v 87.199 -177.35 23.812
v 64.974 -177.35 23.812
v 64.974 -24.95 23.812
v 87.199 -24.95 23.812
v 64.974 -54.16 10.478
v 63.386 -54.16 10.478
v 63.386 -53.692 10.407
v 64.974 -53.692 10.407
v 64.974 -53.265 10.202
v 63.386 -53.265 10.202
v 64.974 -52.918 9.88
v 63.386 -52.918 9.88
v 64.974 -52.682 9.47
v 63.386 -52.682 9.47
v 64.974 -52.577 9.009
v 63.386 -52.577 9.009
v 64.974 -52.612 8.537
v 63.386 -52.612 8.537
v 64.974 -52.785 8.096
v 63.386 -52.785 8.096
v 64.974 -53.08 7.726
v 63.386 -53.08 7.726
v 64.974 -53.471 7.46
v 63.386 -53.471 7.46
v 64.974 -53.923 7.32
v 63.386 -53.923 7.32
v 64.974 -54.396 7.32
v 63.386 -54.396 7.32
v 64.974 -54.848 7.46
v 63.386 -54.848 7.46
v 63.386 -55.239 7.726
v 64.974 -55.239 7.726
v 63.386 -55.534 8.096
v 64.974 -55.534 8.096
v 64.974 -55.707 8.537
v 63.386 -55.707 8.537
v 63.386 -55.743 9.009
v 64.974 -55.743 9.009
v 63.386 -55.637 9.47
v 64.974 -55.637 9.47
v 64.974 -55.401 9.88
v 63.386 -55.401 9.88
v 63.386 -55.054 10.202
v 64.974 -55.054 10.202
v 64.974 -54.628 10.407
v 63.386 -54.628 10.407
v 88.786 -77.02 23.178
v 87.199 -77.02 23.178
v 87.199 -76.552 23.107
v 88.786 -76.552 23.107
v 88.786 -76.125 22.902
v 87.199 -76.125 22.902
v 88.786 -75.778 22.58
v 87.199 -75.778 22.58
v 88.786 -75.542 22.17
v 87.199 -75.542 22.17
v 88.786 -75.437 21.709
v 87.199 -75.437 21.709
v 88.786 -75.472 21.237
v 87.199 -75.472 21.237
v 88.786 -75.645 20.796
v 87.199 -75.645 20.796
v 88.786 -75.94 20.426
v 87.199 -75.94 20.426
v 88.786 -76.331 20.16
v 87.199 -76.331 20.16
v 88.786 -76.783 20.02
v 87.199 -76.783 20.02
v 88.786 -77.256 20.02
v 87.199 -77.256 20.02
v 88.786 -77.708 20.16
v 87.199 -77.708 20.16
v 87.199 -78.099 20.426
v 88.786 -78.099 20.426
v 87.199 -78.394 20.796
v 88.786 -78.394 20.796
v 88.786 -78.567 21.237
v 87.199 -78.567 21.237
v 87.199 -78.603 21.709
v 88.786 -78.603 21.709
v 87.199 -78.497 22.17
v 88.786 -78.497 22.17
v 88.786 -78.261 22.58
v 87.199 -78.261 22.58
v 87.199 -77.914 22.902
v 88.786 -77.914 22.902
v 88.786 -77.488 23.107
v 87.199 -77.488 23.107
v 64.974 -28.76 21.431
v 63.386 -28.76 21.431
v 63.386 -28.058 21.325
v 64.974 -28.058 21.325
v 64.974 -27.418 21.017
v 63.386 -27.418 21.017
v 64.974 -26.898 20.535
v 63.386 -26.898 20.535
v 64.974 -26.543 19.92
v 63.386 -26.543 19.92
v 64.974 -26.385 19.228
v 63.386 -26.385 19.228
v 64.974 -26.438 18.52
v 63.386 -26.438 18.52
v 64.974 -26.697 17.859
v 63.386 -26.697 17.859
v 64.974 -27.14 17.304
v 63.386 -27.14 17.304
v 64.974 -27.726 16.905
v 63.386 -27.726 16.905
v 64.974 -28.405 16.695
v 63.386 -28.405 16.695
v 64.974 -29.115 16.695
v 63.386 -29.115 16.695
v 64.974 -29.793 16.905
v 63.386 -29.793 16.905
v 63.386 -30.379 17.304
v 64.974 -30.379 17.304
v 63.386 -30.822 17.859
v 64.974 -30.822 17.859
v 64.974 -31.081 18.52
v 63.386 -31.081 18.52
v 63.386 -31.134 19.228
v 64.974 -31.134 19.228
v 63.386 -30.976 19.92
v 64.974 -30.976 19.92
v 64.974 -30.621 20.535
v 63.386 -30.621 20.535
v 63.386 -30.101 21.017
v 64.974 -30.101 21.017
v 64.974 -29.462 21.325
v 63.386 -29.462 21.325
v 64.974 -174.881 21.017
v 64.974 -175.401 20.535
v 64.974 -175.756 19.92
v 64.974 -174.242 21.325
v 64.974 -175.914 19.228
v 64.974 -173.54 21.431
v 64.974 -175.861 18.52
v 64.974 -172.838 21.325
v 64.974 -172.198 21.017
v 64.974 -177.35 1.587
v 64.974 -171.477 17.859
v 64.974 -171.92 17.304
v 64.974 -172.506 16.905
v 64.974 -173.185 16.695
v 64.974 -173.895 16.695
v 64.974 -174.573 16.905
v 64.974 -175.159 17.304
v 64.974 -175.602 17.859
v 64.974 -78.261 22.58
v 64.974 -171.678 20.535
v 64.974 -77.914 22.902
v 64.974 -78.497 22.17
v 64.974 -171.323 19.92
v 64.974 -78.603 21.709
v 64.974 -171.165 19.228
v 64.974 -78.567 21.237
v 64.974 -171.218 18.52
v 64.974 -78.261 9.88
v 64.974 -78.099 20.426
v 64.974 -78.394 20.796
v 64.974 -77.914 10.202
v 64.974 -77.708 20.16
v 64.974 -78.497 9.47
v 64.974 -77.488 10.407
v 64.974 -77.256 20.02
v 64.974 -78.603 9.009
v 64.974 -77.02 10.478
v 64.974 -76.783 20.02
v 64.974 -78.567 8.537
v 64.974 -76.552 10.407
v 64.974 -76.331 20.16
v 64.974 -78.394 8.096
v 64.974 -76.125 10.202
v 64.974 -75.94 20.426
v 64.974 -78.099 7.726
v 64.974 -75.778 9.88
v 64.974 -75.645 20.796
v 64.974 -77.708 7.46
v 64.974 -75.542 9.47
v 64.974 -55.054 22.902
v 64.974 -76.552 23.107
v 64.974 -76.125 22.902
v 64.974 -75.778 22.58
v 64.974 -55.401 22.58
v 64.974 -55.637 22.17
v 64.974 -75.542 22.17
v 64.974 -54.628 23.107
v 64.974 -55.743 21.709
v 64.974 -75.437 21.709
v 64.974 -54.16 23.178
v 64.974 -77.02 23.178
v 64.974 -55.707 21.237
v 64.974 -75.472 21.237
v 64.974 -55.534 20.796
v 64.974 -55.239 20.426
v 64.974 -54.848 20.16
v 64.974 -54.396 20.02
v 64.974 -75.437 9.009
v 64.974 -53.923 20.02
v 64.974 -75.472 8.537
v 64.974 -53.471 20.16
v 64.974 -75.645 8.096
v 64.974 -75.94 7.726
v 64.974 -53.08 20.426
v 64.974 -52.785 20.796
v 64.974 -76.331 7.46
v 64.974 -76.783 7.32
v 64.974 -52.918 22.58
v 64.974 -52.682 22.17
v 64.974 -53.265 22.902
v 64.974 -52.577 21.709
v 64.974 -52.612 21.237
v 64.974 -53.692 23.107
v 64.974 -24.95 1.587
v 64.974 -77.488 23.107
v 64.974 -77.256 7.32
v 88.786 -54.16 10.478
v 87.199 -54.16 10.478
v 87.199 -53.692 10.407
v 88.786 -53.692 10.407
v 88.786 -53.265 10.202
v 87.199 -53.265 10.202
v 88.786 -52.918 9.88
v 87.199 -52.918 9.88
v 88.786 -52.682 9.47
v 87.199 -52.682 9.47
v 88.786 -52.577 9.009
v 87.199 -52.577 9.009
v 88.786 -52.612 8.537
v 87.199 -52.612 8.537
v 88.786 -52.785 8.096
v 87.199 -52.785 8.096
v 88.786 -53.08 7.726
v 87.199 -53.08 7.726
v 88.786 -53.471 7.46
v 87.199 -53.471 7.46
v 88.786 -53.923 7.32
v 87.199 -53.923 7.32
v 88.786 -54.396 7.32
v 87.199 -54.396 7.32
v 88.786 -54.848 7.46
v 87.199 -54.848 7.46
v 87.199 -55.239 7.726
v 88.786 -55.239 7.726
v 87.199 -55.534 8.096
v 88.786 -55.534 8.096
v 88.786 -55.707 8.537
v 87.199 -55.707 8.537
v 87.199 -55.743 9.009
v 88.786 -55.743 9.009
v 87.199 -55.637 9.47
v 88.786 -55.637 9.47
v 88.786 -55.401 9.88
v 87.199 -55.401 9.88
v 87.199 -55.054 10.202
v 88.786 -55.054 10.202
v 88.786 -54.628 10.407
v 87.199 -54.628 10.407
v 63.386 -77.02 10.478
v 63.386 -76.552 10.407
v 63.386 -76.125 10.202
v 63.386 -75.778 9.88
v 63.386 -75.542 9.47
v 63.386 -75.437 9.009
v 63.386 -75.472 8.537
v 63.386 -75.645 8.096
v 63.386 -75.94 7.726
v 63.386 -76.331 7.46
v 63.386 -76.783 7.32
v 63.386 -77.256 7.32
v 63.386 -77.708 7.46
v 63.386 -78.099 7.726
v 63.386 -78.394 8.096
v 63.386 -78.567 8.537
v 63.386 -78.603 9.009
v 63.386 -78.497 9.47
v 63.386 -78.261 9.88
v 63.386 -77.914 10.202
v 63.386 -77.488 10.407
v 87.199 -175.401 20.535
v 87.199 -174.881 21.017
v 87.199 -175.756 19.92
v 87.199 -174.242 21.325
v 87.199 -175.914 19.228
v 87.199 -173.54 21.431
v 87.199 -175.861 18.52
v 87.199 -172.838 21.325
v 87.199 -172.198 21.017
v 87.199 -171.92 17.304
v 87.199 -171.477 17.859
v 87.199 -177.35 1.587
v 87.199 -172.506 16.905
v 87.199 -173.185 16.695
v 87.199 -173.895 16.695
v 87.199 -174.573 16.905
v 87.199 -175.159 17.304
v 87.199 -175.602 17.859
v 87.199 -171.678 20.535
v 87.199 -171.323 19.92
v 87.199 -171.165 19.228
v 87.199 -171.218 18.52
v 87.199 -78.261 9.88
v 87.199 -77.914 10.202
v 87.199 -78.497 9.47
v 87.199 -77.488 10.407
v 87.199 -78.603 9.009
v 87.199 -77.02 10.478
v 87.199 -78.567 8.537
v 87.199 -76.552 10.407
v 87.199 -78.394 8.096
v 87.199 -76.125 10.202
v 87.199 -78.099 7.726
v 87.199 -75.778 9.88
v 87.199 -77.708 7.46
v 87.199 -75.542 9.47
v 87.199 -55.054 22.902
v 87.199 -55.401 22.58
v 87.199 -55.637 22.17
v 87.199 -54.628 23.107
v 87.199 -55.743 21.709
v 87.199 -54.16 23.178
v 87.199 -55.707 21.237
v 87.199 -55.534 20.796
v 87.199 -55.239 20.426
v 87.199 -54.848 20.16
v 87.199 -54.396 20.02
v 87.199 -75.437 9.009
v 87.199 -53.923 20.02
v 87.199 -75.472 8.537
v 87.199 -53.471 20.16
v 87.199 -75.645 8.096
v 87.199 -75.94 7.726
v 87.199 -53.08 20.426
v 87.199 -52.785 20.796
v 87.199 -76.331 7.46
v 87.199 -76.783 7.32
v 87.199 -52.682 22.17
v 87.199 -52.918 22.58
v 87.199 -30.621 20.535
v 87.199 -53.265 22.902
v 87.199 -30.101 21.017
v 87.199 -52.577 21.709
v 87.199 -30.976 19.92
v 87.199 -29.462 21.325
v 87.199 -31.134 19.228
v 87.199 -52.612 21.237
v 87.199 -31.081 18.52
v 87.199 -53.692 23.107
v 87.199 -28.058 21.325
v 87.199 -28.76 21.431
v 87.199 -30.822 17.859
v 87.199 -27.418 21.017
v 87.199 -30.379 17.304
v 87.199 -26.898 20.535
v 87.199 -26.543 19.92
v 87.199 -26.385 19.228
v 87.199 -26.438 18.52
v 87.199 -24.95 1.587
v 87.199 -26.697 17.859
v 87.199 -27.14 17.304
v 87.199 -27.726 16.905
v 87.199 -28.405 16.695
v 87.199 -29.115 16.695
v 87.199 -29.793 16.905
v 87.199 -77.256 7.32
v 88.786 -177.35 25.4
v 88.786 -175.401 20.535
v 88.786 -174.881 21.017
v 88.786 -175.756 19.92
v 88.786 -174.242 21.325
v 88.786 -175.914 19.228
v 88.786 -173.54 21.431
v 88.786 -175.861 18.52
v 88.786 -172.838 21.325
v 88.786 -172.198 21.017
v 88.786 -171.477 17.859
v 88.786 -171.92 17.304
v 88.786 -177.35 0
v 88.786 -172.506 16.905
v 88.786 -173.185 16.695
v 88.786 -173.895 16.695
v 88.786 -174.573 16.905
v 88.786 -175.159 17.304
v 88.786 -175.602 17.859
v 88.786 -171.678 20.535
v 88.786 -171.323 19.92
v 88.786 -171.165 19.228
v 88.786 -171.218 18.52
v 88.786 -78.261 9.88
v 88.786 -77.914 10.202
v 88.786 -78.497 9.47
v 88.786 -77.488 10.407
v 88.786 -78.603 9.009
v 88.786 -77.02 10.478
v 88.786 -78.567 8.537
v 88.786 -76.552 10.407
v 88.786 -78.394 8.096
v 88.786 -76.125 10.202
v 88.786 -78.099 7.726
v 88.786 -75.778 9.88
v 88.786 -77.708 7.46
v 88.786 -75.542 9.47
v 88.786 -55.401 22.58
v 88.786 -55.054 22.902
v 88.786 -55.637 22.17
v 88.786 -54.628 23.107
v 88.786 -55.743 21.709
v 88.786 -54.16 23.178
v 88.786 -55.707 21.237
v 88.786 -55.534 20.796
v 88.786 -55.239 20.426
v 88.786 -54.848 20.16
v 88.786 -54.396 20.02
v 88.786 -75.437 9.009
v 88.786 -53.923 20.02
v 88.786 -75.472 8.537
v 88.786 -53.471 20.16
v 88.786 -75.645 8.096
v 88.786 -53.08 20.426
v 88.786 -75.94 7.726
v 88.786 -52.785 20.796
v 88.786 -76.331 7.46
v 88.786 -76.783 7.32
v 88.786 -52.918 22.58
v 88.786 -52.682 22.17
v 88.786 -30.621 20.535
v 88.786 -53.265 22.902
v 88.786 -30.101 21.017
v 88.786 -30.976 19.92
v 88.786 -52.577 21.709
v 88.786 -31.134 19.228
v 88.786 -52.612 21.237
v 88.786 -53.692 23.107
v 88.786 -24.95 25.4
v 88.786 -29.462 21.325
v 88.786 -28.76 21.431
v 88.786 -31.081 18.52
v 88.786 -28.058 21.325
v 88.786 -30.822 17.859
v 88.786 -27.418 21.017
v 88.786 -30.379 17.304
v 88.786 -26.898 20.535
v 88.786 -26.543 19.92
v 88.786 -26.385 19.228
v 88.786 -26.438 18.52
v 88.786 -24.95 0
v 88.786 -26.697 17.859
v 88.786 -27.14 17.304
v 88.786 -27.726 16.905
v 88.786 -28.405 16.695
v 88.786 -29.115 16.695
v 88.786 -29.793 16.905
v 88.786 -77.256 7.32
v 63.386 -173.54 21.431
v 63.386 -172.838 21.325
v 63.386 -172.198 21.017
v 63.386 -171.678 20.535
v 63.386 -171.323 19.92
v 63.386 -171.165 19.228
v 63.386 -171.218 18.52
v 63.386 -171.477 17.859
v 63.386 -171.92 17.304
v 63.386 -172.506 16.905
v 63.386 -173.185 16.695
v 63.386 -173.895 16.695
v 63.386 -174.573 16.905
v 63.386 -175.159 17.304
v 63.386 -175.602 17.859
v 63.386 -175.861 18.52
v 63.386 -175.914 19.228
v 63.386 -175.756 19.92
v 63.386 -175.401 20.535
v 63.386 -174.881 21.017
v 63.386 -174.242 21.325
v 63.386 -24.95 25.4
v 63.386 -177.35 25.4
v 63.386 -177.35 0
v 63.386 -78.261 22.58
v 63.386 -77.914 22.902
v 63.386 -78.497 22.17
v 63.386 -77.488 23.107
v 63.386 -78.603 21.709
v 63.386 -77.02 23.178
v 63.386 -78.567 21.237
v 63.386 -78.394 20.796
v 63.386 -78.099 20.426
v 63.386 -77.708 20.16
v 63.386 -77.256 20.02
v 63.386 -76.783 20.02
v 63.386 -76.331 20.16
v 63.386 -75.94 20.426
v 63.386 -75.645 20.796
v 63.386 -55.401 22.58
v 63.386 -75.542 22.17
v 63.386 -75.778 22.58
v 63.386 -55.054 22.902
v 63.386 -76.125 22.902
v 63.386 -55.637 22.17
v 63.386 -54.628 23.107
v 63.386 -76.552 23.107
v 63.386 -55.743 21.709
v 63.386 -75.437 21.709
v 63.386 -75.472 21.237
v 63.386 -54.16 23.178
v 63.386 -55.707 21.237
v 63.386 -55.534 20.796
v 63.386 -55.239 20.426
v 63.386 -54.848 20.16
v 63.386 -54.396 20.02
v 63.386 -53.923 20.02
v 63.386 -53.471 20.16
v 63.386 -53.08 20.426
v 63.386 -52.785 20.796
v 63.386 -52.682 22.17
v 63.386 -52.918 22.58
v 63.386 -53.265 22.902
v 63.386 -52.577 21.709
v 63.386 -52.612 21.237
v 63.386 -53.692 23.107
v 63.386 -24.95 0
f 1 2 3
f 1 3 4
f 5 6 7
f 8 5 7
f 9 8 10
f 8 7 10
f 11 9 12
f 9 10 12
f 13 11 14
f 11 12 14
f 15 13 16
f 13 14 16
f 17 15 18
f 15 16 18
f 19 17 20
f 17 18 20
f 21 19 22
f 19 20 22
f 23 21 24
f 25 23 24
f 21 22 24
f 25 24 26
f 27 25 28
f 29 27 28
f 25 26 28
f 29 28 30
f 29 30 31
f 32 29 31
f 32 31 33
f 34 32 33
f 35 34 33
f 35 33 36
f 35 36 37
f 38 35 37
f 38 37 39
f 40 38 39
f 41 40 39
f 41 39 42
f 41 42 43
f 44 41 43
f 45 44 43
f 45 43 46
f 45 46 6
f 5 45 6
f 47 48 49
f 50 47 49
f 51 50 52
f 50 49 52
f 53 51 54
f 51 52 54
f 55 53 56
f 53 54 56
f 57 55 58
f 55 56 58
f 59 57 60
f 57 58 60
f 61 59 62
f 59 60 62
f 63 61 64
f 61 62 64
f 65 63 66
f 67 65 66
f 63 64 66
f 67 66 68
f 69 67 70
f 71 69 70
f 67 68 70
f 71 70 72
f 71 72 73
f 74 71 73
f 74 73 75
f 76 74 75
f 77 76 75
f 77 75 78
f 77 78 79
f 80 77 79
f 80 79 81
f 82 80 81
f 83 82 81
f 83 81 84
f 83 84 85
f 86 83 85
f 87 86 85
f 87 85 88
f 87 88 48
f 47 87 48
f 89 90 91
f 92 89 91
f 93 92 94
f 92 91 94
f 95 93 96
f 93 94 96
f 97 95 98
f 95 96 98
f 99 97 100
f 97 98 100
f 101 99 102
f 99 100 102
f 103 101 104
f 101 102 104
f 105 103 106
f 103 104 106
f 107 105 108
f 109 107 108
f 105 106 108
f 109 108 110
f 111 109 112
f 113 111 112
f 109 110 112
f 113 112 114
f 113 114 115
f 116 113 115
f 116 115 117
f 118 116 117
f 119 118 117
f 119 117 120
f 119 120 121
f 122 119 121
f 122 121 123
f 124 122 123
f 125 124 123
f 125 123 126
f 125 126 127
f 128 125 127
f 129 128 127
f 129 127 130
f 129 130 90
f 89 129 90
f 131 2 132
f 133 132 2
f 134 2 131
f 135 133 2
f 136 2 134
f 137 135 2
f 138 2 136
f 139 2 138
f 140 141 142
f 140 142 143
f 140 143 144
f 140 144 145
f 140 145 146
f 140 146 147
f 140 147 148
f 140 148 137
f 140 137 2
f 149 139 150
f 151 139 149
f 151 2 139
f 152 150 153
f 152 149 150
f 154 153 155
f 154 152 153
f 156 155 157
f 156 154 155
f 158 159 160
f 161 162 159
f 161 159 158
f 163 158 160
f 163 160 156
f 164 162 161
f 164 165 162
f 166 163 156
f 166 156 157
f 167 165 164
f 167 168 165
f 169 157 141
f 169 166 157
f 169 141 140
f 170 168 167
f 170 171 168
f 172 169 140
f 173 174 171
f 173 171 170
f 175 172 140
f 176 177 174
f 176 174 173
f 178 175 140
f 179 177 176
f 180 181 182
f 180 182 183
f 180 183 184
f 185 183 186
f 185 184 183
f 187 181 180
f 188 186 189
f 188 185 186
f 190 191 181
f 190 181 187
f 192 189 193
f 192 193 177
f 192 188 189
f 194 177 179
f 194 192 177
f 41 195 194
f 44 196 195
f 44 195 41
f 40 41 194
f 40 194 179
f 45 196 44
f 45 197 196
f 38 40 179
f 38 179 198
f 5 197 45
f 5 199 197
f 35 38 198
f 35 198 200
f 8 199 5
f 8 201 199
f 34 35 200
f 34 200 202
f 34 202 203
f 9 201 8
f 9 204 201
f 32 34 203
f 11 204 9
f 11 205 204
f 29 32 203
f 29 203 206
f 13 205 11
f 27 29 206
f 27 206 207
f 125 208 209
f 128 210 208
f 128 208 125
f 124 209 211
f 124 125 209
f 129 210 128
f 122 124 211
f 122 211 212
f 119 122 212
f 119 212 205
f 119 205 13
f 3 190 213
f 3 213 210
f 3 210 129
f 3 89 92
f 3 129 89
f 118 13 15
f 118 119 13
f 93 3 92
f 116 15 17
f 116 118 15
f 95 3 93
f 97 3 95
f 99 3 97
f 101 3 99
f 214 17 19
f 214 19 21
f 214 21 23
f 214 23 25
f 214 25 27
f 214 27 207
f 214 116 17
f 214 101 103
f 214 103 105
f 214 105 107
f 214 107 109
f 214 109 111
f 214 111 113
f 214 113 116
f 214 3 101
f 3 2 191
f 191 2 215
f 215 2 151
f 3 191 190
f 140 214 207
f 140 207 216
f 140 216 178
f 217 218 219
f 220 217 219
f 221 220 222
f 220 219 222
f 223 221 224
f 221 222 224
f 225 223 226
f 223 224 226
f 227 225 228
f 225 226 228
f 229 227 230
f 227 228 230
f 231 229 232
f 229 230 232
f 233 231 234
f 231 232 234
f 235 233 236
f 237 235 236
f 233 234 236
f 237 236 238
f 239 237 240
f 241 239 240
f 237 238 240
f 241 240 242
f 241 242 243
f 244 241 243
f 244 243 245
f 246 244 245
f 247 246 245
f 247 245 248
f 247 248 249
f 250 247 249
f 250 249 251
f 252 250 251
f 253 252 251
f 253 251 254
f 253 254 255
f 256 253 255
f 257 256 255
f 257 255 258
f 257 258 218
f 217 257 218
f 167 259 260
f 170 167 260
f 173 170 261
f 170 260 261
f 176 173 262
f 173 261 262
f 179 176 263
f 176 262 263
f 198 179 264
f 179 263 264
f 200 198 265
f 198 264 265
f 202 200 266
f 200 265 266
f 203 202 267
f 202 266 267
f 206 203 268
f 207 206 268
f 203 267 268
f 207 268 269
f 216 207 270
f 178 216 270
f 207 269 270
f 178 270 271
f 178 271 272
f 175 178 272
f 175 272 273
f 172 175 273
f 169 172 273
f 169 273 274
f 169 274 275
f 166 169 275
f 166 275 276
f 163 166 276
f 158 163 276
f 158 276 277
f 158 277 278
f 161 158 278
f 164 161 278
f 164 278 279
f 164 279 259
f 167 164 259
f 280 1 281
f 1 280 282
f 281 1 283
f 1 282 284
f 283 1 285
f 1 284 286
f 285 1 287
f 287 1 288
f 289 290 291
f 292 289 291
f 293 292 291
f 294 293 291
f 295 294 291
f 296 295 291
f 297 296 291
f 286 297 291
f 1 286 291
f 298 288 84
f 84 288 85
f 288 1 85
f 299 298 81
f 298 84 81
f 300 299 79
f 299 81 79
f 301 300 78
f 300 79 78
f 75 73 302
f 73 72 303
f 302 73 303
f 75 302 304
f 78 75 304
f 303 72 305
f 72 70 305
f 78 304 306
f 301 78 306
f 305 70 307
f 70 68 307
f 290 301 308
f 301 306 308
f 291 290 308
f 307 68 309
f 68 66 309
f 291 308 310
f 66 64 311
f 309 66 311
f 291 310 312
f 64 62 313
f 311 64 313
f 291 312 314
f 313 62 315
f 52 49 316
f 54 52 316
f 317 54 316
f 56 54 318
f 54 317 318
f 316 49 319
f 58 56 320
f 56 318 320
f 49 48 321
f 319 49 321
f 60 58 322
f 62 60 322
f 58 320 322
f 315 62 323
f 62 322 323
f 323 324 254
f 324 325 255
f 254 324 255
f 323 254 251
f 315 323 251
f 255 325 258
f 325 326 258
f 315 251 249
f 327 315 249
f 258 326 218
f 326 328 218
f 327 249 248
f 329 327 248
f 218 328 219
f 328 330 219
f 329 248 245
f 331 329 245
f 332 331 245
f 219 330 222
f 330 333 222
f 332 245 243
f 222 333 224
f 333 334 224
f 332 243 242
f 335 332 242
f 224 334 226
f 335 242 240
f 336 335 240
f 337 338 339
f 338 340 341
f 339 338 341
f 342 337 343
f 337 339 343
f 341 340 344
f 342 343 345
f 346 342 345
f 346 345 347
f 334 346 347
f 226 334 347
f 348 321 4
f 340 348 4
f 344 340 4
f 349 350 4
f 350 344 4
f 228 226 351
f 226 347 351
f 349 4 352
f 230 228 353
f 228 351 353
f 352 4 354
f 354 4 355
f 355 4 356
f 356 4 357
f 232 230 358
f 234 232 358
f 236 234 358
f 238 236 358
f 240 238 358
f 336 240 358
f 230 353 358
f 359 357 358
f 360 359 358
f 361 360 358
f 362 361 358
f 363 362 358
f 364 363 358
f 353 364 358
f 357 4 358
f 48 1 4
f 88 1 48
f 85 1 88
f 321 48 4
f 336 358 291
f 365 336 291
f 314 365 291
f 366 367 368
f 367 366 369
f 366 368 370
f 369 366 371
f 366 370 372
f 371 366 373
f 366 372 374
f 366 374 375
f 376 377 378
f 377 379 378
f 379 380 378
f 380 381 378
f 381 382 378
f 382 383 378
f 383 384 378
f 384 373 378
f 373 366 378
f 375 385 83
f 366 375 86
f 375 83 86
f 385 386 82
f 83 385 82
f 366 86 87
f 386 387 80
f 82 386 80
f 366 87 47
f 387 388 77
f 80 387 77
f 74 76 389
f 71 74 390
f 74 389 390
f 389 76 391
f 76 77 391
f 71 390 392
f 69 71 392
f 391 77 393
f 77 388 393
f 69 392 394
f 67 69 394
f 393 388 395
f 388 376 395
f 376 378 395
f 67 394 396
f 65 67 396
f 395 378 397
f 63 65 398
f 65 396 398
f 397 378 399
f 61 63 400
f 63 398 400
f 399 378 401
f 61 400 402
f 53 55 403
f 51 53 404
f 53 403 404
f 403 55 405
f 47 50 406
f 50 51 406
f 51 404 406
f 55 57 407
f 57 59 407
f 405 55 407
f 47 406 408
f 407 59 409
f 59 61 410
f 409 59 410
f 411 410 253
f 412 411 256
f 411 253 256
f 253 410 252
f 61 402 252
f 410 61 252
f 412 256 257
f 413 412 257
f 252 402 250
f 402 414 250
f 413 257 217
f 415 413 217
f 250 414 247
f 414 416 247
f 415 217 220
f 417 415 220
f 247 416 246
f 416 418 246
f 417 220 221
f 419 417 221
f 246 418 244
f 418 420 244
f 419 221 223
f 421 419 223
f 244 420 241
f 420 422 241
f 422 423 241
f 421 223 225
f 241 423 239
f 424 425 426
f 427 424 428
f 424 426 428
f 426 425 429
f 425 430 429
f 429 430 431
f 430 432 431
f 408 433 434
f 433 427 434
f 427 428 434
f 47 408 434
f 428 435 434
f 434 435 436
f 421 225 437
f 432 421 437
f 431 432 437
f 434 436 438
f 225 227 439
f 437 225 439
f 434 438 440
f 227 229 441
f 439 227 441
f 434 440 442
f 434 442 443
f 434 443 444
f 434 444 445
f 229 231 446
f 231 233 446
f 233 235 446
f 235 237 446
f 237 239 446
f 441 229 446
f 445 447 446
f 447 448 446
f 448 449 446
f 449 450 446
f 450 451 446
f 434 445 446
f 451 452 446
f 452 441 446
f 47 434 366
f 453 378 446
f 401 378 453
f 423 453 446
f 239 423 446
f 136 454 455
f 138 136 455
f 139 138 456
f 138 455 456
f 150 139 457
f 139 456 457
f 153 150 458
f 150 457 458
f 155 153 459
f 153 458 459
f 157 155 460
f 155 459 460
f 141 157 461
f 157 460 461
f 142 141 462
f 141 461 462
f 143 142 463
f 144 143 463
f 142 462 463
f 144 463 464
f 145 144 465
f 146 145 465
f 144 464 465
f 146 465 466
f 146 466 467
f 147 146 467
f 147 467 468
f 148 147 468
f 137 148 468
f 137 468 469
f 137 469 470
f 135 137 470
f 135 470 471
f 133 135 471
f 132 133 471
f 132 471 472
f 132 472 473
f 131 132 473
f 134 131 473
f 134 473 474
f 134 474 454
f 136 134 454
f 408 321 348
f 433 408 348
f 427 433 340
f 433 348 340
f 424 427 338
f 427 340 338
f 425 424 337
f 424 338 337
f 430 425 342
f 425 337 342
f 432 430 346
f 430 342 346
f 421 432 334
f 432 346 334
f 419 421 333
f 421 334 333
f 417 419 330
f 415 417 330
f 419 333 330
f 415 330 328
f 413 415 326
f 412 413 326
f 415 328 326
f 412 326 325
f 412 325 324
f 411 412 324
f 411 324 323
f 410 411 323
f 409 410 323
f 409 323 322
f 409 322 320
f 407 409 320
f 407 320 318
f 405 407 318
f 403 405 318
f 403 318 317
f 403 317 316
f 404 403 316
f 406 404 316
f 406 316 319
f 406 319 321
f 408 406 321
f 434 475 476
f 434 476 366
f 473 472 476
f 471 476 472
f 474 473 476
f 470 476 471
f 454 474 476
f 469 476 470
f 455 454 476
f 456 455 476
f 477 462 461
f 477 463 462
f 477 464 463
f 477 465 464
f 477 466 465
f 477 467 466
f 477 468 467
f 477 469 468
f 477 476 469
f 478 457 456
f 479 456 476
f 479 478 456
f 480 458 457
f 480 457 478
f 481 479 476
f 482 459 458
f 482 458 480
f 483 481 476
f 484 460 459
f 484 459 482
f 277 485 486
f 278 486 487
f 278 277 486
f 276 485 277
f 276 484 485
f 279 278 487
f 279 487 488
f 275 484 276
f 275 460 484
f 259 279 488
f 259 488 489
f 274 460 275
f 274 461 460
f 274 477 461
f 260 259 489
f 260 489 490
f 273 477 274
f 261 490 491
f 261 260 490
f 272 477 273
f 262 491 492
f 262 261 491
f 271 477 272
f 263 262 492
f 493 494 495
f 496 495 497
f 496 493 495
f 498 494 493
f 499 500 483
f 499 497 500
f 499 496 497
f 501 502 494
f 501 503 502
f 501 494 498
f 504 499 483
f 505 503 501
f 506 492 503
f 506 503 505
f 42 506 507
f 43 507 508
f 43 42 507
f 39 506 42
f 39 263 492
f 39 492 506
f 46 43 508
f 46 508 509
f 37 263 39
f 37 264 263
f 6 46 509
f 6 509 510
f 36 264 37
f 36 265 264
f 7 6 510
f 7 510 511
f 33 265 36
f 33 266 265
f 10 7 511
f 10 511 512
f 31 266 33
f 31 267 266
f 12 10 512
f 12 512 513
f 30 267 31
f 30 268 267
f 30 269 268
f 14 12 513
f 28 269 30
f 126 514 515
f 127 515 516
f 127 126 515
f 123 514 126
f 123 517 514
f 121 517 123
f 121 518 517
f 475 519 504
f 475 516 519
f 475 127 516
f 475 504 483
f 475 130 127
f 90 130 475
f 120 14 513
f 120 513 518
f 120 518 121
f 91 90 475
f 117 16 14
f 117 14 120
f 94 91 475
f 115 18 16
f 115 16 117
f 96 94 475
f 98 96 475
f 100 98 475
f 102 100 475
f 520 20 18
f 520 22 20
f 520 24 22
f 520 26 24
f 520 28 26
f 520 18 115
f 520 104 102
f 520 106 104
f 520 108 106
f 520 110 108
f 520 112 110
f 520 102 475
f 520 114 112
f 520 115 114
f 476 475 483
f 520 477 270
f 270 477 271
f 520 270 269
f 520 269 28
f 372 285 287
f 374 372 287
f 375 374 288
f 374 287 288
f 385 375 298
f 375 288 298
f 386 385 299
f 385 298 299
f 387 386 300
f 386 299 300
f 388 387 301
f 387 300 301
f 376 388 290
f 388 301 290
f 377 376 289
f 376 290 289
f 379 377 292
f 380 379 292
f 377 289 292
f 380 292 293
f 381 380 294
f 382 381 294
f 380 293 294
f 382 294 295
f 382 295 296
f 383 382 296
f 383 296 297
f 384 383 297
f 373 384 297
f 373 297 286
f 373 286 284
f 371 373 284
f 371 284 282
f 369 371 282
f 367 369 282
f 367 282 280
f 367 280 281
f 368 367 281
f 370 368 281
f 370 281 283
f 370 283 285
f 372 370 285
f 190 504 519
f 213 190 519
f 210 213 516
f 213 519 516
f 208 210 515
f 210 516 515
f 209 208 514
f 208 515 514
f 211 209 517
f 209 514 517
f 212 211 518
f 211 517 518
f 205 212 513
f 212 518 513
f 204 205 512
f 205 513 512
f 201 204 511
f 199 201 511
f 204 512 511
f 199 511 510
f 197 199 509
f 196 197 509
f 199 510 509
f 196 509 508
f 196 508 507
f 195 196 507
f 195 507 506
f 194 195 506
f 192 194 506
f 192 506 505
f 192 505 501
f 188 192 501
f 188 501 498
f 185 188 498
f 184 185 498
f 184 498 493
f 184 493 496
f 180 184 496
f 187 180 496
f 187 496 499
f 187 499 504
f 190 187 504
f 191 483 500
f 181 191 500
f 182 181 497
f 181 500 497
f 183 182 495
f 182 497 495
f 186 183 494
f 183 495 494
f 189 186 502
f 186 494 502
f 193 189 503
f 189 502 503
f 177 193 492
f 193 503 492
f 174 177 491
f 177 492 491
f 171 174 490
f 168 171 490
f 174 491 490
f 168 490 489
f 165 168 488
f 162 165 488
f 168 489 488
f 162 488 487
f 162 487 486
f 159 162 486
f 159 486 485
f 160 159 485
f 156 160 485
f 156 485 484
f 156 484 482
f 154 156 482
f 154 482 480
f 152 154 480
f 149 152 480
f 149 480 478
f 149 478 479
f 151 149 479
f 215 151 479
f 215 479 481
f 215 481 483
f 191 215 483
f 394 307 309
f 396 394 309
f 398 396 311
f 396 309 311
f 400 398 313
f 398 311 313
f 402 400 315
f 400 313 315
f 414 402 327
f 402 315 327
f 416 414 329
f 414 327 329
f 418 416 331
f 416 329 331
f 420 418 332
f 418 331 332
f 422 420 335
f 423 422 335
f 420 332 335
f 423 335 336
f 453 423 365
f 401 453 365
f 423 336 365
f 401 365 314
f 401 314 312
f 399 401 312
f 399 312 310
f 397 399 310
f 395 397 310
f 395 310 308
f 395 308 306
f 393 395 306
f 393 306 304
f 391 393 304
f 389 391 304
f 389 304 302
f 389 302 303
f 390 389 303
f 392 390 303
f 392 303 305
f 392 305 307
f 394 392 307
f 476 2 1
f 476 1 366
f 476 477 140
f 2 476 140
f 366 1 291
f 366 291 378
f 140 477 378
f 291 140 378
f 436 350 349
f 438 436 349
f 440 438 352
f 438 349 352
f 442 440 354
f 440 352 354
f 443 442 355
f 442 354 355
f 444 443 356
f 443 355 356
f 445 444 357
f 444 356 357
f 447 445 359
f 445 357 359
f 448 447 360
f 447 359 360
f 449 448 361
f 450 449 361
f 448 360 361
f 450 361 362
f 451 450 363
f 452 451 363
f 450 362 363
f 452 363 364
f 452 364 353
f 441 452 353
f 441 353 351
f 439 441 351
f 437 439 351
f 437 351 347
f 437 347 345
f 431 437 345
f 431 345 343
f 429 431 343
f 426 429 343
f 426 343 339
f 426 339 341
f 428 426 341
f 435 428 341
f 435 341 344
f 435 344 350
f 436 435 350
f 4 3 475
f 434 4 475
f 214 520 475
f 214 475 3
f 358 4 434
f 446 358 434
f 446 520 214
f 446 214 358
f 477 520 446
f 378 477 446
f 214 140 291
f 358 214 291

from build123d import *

# Parameters (mm, degrees)
SKETCH1_W                      = 25.4
SKETCH1_H                      = 152.4
BOSS_EXTRUDE1_DEPTH            = 25.4
SKETCH2_W                      = 22.225
SKETCH2_H                      = 22.225
CUT_EXTRUDE1_DEPTH             = 279.4
F_3_16_0_1875_DIAMETER_HOLE2_D = 4.7625
F_1_8_0_125_DIAMETER_HOLE1_D   = 3.175


with BuildPart() as part:
    # Sketch1 → Boss-Extrude1 (new body)
    with BuildSketch(Plane.XY):
        with Locations((76.086049872, -101.14964539)):
            Rectangle(SKETCH1_W, SKETCH1_H)
    extrude(amount=BOSS_EXTRUDE1_DEPTH)

    # Sketch2 → Cut-Extrude1 (cut)
    with BuildSketch(Plane(origin=(0, -24.94964539, 0), x_dir=(1, 0, 0), z_dir=(0, 1, 0))):
        with Locations((76.086049872, -12.7)):
            Rectangle(SKETCH2_W, SKETCH2_H)
    extrude(amount=-CUT_EXTRUDE1_DEPTH, mode=Mode.SUBTRACT)

    # 3/16 (0.1875) Diameter Hole2 (through all)
    with Locations(Plane(origin=(88.786049872, 0, 0), x_dir=(0, 0, -1), z_dir=(1, 0, 0))):
        with Locations((-19.05, -173.53964539), (-19.05, -28.75964539)):
            Hole(F_3_16_0_1875_DIAMETER_HOLE2_D / 2)

    # 1/8 (0.125) Diameter Hole1 (through all)
    with Locations(Plane(origin=(88.786049872, 0, 0), x_dir=(0, 0, -1), z_dir=(1, 0, 0))):
        with Locations((-21.59, -77.01964539), (-8.89, -77.01964539), (-21.59, -54.15964539), (-8.89, -54.15964539)):
            Hole(F_1_8_0_125_DIAMETER_HOLE1_D / 2)


solid = part.part
